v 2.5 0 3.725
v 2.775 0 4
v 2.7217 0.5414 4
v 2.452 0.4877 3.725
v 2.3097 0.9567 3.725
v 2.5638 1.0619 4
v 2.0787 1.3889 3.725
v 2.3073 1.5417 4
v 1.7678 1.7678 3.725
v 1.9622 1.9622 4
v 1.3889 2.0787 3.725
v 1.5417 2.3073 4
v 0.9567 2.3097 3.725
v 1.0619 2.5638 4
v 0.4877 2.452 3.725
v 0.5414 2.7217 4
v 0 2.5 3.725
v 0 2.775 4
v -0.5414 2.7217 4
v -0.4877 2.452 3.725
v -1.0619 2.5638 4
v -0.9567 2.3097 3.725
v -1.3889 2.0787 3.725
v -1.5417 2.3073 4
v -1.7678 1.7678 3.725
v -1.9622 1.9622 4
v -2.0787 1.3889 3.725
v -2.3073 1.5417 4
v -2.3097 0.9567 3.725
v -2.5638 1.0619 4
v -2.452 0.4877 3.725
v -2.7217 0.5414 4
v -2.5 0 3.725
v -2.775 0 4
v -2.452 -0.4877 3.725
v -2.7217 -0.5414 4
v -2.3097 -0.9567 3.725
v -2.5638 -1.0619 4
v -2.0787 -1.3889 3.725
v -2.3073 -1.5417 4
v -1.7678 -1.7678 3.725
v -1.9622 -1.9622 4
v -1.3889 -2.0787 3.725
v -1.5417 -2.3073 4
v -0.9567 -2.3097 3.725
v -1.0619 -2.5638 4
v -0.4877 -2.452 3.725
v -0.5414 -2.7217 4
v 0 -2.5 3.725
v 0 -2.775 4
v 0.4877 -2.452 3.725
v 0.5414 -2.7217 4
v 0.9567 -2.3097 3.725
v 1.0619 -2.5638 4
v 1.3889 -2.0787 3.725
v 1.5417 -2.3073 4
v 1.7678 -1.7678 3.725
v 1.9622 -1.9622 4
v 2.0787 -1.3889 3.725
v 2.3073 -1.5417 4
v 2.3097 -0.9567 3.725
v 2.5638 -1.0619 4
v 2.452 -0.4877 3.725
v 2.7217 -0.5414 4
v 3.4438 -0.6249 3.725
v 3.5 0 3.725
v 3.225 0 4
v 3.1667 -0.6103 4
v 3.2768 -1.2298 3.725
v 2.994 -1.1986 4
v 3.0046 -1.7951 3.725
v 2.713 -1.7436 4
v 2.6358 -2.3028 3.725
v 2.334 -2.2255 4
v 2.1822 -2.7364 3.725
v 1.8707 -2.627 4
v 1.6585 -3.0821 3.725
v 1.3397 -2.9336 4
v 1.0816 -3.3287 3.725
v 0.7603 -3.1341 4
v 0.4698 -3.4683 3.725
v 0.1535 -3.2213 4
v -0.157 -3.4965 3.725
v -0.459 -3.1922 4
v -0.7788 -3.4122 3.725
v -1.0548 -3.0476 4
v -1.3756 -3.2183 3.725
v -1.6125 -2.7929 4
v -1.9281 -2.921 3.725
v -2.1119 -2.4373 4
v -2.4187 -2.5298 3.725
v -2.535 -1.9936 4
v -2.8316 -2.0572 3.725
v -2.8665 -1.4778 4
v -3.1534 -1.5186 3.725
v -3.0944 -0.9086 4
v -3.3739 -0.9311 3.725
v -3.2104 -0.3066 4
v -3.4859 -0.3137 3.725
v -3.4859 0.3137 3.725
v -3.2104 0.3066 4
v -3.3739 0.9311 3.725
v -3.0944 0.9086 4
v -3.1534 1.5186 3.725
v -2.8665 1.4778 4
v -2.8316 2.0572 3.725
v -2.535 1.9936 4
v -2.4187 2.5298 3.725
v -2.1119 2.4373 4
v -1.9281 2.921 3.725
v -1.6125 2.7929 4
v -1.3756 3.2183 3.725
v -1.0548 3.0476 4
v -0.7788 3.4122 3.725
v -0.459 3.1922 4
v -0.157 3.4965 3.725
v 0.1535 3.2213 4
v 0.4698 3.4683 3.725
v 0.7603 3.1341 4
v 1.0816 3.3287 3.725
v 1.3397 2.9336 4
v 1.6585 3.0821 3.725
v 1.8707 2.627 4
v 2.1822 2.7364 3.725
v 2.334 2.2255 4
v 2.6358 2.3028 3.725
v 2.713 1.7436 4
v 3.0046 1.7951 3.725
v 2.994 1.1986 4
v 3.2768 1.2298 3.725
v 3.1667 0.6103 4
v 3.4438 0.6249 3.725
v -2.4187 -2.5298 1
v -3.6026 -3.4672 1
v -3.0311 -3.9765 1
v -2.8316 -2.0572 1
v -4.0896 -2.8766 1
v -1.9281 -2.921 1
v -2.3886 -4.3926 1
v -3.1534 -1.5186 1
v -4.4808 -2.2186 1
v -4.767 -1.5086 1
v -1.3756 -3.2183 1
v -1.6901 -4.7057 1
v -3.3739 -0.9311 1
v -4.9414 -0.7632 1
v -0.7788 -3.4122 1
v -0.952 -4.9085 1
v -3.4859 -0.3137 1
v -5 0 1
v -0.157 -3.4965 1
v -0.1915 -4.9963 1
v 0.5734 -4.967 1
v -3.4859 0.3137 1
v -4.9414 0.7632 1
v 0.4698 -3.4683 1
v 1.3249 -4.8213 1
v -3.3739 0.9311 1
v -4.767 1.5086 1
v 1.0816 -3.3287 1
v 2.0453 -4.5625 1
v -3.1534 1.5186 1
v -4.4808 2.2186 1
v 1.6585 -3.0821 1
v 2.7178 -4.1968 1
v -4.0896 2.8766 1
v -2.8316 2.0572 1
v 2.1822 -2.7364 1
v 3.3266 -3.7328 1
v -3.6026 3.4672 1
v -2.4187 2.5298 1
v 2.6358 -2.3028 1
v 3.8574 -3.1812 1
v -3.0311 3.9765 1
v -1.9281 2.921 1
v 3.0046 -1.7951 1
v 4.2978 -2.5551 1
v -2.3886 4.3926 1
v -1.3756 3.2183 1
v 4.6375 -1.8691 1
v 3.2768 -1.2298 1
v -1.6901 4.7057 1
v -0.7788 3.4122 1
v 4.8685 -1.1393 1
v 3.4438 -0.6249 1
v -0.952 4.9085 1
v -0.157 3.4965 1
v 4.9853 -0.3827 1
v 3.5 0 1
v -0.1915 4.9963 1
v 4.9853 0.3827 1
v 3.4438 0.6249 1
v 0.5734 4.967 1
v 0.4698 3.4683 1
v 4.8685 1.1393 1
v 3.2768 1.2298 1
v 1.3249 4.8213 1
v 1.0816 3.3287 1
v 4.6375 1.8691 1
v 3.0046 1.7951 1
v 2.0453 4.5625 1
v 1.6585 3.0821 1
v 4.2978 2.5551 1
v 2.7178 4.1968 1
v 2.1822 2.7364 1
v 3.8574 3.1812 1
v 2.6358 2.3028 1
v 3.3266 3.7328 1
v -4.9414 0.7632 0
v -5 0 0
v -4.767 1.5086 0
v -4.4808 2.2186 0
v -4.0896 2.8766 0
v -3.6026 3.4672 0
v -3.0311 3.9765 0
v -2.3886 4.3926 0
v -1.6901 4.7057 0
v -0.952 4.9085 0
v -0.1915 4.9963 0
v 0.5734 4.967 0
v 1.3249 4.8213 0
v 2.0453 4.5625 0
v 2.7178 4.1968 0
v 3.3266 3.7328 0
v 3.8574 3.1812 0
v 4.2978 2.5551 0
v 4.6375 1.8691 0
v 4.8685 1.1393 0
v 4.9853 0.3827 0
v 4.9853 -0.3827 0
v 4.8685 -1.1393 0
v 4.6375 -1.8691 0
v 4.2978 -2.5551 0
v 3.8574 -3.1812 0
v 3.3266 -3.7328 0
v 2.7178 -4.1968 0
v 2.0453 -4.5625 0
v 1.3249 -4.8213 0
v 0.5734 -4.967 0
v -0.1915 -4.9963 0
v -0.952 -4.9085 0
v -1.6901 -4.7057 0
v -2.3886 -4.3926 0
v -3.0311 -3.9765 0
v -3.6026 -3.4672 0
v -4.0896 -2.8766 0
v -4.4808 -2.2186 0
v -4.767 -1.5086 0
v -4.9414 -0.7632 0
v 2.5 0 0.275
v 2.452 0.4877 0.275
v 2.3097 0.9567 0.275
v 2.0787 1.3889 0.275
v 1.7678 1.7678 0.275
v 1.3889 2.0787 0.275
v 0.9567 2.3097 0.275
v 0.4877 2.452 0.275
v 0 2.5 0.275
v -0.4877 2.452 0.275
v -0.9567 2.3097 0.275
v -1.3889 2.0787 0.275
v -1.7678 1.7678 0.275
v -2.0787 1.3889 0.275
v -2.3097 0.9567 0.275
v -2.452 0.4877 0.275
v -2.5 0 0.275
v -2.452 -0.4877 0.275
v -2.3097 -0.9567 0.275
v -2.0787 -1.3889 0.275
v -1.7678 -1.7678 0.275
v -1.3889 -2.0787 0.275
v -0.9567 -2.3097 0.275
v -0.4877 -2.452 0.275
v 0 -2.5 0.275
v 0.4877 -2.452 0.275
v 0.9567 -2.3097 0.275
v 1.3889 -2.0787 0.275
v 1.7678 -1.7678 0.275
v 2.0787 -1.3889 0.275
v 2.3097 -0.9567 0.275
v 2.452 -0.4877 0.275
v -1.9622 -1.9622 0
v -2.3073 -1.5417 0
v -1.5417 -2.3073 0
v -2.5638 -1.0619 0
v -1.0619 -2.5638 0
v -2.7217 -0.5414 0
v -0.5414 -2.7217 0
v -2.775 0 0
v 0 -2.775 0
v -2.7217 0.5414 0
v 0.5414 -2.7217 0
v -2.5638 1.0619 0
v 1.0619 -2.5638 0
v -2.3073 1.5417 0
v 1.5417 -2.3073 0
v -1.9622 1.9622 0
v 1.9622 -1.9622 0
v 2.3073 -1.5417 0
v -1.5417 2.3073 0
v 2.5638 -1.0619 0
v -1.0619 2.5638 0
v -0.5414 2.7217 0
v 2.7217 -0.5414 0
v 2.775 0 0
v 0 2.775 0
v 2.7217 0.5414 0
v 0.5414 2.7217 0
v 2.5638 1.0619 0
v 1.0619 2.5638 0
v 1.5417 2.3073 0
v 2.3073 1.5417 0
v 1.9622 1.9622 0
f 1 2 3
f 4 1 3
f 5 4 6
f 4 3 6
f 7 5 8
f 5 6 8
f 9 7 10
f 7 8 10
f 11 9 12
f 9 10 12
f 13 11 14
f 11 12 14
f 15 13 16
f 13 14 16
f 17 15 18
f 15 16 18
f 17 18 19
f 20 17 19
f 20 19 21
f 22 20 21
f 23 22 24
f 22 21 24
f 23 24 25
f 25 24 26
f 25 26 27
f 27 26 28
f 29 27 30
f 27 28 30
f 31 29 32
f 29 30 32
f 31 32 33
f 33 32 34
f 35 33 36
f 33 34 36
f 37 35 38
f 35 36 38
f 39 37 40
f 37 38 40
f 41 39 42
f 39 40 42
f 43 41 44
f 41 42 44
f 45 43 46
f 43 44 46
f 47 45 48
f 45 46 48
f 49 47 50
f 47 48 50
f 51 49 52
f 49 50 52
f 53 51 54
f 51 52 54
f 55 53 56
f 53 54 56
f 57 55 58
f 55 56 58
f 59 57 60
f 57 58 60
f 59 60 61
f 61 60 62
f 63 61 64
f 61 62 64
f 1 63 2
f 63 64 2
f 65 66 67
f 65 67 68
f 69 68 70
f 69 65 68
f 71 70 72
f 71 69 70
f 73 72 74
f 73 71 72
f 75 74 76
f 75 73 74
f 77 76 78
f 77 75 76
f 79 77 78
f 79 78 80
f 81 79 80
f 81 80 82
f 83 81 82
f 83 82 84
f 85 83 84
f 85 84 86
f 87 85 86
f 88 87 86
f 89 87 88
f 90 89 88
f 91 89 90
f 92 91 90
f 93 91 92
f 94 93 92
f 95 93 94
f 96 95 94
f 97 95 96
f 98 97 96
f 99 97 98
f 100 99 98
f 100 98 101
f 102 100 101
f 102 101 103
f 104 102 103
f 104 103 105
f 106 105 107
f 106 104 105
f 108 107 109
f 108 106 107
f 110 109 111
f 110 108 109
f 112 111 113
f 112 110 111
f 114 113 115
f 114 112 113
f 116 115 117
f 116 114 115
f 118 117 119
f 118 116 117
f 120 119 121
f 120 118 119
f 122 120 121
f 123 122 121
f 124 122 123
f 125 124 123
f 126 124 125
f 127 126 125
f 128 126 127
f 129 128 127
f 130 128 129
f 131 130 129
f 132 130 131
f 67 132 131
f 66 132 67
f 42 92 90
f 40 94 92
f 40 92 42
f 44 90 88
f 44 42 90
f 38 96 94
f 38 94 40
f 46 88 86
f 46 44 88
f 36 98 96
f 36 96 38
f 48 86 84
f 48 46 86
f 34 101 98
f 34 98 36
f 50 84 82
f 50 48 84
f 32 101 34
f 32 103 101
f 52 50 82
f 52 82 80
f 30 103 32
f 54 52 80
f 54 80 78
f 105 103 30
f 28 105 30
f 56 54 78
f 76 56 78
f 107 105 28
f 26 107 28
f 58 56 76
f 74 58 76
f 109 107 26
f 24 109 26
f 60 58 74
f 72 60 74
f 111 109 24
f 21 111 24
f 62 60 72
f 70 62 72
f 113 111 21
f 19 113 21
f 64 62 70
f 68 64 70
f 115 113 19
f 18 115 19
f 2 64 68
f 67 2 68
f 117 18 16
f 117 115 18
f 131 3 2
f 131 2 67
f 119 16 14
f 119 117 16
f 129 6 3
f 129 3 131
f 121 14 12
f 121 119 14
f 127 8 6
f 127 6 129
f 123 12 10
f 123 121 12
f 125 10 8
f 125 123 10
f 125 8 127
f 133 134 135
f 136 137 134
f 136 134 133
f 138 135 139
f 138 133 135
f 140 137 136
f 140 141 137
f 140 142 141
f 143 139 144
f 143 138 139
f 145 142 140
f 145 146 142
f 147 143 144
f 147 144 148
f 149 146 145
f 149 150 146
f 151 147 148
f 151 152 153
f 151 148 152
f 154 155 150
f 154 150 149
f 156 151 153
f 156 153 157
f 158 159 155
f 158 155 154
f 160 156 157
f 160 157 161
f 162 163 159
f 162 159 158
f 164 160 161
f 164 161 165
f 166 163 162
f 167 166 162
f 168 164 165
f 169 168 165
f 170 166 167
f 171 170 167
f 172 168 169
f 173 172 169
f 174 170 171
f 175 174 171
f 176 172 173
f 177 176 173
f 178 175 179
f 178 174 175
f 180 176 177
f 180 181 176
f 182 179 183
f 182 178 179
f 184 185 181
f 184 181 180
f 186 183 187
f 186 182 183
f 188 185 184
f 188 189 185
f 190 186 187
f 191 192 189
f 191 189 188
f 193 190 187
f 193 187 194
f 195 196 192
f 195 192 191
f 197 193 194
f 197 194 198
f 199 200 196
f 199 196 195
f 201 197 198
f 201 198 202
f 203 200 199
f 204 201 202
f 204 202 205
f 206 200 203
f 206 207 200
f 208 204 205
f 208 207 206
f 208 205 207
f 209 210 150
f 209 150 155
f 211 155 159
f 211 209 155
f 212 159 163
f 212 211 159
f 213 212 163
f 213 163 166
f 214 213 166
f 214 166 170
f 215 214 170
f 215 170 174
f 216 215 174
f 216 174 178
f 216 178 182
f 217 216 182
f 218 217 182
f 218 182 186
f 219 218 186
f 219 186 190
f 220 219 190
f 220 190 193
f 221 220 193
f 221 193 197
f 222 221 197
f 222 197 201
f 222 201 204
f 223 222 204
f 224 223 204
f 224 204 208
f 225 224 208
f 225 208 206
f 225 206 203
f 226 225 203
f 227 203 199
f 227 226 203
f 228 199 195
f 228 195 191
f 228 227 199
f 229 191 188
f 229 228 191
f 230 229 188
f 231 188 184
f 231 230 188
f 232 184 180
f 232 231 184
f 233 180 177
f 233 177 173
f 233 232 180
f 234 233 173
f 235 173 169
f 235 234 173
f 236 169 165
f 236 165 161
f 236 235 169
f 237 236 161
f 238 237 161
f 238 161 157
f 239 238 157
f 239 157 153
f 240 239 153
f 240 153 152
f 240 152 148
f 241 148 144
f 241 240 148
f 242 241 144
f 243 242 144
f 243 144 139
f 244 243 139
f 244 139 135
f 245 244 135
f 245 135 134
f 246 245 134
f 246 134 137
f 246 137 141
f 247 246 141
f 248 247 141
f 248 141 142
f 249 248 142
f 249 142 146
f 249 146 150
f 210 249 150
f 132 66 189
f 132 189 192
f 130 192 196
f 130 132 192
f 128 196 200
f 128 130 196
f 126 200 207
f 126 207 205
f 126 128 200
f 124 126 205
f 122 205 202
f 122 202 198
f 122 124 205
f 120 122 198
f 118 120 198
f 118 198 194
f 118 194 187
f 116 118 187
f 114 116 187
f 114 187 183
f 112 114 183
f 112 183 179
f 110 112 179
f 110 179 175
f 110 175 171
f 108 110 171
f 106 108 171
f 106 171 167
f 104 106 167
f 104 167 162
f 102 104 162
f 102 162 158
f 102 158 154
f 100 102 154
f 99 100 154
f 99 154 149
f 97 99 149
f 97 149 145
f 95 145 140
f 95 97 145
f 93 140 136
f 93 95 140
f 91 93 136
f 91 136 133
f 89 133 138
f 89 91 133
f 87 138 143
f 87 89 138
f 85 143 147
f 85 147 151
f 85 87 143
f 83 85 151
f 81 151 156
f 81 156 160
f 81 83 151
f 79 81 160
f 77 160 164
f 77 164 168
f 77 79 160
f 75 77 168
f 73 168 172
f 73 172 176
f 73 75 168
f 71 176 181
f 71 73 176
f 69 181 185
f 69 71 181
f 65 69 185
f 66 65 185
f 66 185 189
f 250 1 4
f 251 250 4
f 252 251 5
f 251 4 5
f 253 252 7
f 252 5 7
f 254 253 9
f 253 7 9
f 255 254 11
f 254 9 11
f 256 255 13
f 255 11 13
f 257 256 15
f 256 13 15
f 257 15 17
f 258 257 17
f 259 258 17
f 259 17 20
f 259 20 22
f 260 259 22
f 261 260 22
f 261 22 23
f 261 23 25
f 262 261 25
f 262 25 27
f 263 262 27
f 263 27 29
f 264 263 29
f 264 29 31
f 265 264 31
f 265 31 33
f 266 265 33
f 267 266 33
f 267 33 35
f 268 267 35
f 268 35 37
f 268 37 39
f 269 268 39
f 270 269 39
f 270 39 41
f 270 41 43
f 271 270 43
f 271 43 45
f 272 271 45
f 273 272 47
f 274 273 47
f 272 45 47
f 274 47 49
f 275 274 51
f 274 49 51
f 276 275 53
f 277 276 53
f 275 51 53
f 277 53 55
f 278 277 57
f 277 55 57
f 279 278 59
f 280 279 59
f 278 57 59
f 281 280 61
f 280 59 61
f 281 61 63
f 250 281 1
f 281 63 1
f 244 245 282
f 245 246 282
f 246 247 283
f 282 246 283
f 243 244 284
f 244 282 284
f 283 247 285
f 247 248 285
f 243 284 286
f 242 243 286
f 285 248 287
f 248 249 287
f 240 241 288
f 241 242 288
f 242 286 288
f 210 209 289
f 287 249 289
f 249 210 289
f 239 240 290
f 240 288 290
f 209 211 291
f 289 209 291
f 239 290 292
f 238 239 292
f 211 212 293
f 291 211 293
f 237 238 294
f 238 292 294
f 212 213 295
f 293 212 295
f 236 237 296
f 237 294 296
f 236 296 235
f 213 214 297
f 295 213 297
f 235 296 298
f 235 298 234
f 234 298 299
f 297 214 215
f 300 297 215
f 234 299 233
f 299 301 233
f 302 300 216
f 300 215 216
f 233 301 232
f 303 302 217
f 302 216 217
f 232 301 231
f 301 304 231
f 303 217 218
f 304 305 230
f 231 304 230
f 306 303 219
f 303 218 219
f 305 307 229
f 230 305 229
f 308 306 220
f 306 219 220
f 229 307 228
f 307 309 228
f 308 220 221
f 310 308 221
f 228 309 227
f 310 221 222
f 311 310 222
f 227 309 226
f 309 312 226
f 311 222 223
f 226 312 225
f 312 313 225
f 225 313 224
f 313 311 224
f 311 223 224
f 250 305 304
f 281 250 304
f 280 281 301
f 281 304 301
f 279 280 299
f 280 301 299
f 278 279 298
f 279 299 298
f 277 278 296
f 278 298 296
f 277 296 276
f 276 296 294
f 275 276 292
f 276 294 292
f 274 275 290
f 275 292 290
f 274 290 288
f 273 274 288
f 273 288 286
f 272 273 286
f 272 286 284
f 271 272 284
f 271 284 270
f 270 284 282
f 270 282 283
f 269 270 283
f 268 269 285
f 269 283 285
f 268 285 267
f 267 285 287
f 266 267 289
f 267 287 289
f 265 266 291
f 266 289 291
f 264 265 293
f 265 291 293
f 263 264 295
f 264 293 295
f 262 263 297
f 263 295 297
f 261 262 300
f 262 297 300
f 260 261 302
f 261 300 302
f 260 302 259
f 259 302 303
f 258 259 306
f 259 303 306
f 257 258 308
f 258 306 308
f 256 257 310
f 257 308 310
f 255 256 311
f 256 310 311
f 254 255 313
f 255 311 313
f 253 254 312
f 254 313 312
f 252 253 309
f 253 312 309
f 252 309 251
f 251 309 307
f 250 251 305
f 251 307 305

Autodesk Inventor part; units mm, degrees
ref_plane "YZ Plane" through (0, 0, 0) normal (1, 0, 0) x (0, 1, 0)
ref_plane "XZ Plane" through (0, 0, 0) normal (0, 1, 0) x (-1, 0, 0)
ref_plane "XY Plane" through (0, 0, 0) normal (0, 0, 1) x (1, 0, 0)
sketch "スケッチ1" plane through (0, 0, 0) normal (0, 1, 0) x (-1, 0, 0)
  line L0 (-3, 0.3) -> (-3, 3.7)
  line L1 (-3.3, 4) -> (-3.7, 4)
  line L2 (-4, 3) -> (-4, 1)
  line L3 (-4, 1) -> (-6, 1)
  line L4 (-6, 1) -> (-6, 0)
  line L5 (-6, 0) -> (-3.3, 0)
  line L6 (-3, 3.7) -> (-3.3, 4)
  line L7 (-3, 0.3) -> (-3.3, 0)
  line L8 (-3.7, 4) -> (-4, 3)
  line L9 (0, -0.8) -> (0, 4.8) projected
  point P0 (0, 0)
  point P1 (-3, 0)
  point P2 (-3, 4)
  point P3 (-4, 4)
  dimension "d2" = 1
  dimension "d9" = 1
  dimension "d11" = 6
  dimension "d12" = 8
  dimension "d13" = 12
  dimension "d14" = 0.3
  dimension "d15" = 0.3
  dimension "d16" = 0.3
  dimension "d17" = 0.3
  dimension "d18" = 0.3
  dimension "d19" = 4
revolve "回転1" add sketch "スケッチ1" angle 360 about axis through (0, 0, -10) along (0, 0, 1)
sketch "스케치2" plane through (0, 0, 0) normal (0, 0, -1) x (-1, 0, 0)
  circle A0 centre (0, 0) radius 3.3 projected
  circle A1 centre (0, 0) radius 6 projected
  circle A2 centre (0, 0) radius 3.025
  dimension "d20" = 6.05
extrude "돌출1" cut sketch "스케치2" against normal up to surface (4 mm away) contours A2
sketch "스케치3" plane through (0, 0, 0) normal (0, 0, -1) x (-1, 0, 0)
  circle A0 centre (0, 0) radius 3.3 projected
  circle A1 centre (0, 0) radius 6 projected
  circle A2 centre (0, 0) radius 5
  dimension "d23" = 10
extrude "돌출2" cut sketch "스케치3" against normal through all contours A1
sketch "스케치4" plane through (0, 0, 4) normal (0, 0, 1) x (1, 0, 0)
  circle A0 centre (0, 0) radius 4 projected
  circle A1 centre (0, 0) radius 3.7 projected
  circle A2 centre (0, 0) radius 2.5
  dimension "d26" = 5
extrude "돌출3" add sketch "스케치4" against normal up to surface (4 mm away) contours A0 | A1
sketch "스케치5" plane through (0, 0, 4) normal (0, 0, 1) x (1, 0, 0)
  circle A0 centre (0, 0) radius 3.5
  circle A1 centre (0, 0) radius 4 projected
  circle A2 centre (0, 0) radius 2.5 projected
  dimension "d29" = 7
extrude "돌출4" cut sketch "스케치5" against normal up to surface (3 mm away) contours A1
chamfer "모따기1" distance 0.275 angle 45 1 edges at (-3.5, 0, 4)
chamfer "모따기2" distance 0.275 angle 45 2 edges at (-2.5, 0, 4) (-2.5, 0, 0)
equation "\"d15\" = d14"
equation "\"d16\" = d14"
equation "\"d17\" = d16"
equation "\"d18\" = d14"
properties part number "80F-0503"
